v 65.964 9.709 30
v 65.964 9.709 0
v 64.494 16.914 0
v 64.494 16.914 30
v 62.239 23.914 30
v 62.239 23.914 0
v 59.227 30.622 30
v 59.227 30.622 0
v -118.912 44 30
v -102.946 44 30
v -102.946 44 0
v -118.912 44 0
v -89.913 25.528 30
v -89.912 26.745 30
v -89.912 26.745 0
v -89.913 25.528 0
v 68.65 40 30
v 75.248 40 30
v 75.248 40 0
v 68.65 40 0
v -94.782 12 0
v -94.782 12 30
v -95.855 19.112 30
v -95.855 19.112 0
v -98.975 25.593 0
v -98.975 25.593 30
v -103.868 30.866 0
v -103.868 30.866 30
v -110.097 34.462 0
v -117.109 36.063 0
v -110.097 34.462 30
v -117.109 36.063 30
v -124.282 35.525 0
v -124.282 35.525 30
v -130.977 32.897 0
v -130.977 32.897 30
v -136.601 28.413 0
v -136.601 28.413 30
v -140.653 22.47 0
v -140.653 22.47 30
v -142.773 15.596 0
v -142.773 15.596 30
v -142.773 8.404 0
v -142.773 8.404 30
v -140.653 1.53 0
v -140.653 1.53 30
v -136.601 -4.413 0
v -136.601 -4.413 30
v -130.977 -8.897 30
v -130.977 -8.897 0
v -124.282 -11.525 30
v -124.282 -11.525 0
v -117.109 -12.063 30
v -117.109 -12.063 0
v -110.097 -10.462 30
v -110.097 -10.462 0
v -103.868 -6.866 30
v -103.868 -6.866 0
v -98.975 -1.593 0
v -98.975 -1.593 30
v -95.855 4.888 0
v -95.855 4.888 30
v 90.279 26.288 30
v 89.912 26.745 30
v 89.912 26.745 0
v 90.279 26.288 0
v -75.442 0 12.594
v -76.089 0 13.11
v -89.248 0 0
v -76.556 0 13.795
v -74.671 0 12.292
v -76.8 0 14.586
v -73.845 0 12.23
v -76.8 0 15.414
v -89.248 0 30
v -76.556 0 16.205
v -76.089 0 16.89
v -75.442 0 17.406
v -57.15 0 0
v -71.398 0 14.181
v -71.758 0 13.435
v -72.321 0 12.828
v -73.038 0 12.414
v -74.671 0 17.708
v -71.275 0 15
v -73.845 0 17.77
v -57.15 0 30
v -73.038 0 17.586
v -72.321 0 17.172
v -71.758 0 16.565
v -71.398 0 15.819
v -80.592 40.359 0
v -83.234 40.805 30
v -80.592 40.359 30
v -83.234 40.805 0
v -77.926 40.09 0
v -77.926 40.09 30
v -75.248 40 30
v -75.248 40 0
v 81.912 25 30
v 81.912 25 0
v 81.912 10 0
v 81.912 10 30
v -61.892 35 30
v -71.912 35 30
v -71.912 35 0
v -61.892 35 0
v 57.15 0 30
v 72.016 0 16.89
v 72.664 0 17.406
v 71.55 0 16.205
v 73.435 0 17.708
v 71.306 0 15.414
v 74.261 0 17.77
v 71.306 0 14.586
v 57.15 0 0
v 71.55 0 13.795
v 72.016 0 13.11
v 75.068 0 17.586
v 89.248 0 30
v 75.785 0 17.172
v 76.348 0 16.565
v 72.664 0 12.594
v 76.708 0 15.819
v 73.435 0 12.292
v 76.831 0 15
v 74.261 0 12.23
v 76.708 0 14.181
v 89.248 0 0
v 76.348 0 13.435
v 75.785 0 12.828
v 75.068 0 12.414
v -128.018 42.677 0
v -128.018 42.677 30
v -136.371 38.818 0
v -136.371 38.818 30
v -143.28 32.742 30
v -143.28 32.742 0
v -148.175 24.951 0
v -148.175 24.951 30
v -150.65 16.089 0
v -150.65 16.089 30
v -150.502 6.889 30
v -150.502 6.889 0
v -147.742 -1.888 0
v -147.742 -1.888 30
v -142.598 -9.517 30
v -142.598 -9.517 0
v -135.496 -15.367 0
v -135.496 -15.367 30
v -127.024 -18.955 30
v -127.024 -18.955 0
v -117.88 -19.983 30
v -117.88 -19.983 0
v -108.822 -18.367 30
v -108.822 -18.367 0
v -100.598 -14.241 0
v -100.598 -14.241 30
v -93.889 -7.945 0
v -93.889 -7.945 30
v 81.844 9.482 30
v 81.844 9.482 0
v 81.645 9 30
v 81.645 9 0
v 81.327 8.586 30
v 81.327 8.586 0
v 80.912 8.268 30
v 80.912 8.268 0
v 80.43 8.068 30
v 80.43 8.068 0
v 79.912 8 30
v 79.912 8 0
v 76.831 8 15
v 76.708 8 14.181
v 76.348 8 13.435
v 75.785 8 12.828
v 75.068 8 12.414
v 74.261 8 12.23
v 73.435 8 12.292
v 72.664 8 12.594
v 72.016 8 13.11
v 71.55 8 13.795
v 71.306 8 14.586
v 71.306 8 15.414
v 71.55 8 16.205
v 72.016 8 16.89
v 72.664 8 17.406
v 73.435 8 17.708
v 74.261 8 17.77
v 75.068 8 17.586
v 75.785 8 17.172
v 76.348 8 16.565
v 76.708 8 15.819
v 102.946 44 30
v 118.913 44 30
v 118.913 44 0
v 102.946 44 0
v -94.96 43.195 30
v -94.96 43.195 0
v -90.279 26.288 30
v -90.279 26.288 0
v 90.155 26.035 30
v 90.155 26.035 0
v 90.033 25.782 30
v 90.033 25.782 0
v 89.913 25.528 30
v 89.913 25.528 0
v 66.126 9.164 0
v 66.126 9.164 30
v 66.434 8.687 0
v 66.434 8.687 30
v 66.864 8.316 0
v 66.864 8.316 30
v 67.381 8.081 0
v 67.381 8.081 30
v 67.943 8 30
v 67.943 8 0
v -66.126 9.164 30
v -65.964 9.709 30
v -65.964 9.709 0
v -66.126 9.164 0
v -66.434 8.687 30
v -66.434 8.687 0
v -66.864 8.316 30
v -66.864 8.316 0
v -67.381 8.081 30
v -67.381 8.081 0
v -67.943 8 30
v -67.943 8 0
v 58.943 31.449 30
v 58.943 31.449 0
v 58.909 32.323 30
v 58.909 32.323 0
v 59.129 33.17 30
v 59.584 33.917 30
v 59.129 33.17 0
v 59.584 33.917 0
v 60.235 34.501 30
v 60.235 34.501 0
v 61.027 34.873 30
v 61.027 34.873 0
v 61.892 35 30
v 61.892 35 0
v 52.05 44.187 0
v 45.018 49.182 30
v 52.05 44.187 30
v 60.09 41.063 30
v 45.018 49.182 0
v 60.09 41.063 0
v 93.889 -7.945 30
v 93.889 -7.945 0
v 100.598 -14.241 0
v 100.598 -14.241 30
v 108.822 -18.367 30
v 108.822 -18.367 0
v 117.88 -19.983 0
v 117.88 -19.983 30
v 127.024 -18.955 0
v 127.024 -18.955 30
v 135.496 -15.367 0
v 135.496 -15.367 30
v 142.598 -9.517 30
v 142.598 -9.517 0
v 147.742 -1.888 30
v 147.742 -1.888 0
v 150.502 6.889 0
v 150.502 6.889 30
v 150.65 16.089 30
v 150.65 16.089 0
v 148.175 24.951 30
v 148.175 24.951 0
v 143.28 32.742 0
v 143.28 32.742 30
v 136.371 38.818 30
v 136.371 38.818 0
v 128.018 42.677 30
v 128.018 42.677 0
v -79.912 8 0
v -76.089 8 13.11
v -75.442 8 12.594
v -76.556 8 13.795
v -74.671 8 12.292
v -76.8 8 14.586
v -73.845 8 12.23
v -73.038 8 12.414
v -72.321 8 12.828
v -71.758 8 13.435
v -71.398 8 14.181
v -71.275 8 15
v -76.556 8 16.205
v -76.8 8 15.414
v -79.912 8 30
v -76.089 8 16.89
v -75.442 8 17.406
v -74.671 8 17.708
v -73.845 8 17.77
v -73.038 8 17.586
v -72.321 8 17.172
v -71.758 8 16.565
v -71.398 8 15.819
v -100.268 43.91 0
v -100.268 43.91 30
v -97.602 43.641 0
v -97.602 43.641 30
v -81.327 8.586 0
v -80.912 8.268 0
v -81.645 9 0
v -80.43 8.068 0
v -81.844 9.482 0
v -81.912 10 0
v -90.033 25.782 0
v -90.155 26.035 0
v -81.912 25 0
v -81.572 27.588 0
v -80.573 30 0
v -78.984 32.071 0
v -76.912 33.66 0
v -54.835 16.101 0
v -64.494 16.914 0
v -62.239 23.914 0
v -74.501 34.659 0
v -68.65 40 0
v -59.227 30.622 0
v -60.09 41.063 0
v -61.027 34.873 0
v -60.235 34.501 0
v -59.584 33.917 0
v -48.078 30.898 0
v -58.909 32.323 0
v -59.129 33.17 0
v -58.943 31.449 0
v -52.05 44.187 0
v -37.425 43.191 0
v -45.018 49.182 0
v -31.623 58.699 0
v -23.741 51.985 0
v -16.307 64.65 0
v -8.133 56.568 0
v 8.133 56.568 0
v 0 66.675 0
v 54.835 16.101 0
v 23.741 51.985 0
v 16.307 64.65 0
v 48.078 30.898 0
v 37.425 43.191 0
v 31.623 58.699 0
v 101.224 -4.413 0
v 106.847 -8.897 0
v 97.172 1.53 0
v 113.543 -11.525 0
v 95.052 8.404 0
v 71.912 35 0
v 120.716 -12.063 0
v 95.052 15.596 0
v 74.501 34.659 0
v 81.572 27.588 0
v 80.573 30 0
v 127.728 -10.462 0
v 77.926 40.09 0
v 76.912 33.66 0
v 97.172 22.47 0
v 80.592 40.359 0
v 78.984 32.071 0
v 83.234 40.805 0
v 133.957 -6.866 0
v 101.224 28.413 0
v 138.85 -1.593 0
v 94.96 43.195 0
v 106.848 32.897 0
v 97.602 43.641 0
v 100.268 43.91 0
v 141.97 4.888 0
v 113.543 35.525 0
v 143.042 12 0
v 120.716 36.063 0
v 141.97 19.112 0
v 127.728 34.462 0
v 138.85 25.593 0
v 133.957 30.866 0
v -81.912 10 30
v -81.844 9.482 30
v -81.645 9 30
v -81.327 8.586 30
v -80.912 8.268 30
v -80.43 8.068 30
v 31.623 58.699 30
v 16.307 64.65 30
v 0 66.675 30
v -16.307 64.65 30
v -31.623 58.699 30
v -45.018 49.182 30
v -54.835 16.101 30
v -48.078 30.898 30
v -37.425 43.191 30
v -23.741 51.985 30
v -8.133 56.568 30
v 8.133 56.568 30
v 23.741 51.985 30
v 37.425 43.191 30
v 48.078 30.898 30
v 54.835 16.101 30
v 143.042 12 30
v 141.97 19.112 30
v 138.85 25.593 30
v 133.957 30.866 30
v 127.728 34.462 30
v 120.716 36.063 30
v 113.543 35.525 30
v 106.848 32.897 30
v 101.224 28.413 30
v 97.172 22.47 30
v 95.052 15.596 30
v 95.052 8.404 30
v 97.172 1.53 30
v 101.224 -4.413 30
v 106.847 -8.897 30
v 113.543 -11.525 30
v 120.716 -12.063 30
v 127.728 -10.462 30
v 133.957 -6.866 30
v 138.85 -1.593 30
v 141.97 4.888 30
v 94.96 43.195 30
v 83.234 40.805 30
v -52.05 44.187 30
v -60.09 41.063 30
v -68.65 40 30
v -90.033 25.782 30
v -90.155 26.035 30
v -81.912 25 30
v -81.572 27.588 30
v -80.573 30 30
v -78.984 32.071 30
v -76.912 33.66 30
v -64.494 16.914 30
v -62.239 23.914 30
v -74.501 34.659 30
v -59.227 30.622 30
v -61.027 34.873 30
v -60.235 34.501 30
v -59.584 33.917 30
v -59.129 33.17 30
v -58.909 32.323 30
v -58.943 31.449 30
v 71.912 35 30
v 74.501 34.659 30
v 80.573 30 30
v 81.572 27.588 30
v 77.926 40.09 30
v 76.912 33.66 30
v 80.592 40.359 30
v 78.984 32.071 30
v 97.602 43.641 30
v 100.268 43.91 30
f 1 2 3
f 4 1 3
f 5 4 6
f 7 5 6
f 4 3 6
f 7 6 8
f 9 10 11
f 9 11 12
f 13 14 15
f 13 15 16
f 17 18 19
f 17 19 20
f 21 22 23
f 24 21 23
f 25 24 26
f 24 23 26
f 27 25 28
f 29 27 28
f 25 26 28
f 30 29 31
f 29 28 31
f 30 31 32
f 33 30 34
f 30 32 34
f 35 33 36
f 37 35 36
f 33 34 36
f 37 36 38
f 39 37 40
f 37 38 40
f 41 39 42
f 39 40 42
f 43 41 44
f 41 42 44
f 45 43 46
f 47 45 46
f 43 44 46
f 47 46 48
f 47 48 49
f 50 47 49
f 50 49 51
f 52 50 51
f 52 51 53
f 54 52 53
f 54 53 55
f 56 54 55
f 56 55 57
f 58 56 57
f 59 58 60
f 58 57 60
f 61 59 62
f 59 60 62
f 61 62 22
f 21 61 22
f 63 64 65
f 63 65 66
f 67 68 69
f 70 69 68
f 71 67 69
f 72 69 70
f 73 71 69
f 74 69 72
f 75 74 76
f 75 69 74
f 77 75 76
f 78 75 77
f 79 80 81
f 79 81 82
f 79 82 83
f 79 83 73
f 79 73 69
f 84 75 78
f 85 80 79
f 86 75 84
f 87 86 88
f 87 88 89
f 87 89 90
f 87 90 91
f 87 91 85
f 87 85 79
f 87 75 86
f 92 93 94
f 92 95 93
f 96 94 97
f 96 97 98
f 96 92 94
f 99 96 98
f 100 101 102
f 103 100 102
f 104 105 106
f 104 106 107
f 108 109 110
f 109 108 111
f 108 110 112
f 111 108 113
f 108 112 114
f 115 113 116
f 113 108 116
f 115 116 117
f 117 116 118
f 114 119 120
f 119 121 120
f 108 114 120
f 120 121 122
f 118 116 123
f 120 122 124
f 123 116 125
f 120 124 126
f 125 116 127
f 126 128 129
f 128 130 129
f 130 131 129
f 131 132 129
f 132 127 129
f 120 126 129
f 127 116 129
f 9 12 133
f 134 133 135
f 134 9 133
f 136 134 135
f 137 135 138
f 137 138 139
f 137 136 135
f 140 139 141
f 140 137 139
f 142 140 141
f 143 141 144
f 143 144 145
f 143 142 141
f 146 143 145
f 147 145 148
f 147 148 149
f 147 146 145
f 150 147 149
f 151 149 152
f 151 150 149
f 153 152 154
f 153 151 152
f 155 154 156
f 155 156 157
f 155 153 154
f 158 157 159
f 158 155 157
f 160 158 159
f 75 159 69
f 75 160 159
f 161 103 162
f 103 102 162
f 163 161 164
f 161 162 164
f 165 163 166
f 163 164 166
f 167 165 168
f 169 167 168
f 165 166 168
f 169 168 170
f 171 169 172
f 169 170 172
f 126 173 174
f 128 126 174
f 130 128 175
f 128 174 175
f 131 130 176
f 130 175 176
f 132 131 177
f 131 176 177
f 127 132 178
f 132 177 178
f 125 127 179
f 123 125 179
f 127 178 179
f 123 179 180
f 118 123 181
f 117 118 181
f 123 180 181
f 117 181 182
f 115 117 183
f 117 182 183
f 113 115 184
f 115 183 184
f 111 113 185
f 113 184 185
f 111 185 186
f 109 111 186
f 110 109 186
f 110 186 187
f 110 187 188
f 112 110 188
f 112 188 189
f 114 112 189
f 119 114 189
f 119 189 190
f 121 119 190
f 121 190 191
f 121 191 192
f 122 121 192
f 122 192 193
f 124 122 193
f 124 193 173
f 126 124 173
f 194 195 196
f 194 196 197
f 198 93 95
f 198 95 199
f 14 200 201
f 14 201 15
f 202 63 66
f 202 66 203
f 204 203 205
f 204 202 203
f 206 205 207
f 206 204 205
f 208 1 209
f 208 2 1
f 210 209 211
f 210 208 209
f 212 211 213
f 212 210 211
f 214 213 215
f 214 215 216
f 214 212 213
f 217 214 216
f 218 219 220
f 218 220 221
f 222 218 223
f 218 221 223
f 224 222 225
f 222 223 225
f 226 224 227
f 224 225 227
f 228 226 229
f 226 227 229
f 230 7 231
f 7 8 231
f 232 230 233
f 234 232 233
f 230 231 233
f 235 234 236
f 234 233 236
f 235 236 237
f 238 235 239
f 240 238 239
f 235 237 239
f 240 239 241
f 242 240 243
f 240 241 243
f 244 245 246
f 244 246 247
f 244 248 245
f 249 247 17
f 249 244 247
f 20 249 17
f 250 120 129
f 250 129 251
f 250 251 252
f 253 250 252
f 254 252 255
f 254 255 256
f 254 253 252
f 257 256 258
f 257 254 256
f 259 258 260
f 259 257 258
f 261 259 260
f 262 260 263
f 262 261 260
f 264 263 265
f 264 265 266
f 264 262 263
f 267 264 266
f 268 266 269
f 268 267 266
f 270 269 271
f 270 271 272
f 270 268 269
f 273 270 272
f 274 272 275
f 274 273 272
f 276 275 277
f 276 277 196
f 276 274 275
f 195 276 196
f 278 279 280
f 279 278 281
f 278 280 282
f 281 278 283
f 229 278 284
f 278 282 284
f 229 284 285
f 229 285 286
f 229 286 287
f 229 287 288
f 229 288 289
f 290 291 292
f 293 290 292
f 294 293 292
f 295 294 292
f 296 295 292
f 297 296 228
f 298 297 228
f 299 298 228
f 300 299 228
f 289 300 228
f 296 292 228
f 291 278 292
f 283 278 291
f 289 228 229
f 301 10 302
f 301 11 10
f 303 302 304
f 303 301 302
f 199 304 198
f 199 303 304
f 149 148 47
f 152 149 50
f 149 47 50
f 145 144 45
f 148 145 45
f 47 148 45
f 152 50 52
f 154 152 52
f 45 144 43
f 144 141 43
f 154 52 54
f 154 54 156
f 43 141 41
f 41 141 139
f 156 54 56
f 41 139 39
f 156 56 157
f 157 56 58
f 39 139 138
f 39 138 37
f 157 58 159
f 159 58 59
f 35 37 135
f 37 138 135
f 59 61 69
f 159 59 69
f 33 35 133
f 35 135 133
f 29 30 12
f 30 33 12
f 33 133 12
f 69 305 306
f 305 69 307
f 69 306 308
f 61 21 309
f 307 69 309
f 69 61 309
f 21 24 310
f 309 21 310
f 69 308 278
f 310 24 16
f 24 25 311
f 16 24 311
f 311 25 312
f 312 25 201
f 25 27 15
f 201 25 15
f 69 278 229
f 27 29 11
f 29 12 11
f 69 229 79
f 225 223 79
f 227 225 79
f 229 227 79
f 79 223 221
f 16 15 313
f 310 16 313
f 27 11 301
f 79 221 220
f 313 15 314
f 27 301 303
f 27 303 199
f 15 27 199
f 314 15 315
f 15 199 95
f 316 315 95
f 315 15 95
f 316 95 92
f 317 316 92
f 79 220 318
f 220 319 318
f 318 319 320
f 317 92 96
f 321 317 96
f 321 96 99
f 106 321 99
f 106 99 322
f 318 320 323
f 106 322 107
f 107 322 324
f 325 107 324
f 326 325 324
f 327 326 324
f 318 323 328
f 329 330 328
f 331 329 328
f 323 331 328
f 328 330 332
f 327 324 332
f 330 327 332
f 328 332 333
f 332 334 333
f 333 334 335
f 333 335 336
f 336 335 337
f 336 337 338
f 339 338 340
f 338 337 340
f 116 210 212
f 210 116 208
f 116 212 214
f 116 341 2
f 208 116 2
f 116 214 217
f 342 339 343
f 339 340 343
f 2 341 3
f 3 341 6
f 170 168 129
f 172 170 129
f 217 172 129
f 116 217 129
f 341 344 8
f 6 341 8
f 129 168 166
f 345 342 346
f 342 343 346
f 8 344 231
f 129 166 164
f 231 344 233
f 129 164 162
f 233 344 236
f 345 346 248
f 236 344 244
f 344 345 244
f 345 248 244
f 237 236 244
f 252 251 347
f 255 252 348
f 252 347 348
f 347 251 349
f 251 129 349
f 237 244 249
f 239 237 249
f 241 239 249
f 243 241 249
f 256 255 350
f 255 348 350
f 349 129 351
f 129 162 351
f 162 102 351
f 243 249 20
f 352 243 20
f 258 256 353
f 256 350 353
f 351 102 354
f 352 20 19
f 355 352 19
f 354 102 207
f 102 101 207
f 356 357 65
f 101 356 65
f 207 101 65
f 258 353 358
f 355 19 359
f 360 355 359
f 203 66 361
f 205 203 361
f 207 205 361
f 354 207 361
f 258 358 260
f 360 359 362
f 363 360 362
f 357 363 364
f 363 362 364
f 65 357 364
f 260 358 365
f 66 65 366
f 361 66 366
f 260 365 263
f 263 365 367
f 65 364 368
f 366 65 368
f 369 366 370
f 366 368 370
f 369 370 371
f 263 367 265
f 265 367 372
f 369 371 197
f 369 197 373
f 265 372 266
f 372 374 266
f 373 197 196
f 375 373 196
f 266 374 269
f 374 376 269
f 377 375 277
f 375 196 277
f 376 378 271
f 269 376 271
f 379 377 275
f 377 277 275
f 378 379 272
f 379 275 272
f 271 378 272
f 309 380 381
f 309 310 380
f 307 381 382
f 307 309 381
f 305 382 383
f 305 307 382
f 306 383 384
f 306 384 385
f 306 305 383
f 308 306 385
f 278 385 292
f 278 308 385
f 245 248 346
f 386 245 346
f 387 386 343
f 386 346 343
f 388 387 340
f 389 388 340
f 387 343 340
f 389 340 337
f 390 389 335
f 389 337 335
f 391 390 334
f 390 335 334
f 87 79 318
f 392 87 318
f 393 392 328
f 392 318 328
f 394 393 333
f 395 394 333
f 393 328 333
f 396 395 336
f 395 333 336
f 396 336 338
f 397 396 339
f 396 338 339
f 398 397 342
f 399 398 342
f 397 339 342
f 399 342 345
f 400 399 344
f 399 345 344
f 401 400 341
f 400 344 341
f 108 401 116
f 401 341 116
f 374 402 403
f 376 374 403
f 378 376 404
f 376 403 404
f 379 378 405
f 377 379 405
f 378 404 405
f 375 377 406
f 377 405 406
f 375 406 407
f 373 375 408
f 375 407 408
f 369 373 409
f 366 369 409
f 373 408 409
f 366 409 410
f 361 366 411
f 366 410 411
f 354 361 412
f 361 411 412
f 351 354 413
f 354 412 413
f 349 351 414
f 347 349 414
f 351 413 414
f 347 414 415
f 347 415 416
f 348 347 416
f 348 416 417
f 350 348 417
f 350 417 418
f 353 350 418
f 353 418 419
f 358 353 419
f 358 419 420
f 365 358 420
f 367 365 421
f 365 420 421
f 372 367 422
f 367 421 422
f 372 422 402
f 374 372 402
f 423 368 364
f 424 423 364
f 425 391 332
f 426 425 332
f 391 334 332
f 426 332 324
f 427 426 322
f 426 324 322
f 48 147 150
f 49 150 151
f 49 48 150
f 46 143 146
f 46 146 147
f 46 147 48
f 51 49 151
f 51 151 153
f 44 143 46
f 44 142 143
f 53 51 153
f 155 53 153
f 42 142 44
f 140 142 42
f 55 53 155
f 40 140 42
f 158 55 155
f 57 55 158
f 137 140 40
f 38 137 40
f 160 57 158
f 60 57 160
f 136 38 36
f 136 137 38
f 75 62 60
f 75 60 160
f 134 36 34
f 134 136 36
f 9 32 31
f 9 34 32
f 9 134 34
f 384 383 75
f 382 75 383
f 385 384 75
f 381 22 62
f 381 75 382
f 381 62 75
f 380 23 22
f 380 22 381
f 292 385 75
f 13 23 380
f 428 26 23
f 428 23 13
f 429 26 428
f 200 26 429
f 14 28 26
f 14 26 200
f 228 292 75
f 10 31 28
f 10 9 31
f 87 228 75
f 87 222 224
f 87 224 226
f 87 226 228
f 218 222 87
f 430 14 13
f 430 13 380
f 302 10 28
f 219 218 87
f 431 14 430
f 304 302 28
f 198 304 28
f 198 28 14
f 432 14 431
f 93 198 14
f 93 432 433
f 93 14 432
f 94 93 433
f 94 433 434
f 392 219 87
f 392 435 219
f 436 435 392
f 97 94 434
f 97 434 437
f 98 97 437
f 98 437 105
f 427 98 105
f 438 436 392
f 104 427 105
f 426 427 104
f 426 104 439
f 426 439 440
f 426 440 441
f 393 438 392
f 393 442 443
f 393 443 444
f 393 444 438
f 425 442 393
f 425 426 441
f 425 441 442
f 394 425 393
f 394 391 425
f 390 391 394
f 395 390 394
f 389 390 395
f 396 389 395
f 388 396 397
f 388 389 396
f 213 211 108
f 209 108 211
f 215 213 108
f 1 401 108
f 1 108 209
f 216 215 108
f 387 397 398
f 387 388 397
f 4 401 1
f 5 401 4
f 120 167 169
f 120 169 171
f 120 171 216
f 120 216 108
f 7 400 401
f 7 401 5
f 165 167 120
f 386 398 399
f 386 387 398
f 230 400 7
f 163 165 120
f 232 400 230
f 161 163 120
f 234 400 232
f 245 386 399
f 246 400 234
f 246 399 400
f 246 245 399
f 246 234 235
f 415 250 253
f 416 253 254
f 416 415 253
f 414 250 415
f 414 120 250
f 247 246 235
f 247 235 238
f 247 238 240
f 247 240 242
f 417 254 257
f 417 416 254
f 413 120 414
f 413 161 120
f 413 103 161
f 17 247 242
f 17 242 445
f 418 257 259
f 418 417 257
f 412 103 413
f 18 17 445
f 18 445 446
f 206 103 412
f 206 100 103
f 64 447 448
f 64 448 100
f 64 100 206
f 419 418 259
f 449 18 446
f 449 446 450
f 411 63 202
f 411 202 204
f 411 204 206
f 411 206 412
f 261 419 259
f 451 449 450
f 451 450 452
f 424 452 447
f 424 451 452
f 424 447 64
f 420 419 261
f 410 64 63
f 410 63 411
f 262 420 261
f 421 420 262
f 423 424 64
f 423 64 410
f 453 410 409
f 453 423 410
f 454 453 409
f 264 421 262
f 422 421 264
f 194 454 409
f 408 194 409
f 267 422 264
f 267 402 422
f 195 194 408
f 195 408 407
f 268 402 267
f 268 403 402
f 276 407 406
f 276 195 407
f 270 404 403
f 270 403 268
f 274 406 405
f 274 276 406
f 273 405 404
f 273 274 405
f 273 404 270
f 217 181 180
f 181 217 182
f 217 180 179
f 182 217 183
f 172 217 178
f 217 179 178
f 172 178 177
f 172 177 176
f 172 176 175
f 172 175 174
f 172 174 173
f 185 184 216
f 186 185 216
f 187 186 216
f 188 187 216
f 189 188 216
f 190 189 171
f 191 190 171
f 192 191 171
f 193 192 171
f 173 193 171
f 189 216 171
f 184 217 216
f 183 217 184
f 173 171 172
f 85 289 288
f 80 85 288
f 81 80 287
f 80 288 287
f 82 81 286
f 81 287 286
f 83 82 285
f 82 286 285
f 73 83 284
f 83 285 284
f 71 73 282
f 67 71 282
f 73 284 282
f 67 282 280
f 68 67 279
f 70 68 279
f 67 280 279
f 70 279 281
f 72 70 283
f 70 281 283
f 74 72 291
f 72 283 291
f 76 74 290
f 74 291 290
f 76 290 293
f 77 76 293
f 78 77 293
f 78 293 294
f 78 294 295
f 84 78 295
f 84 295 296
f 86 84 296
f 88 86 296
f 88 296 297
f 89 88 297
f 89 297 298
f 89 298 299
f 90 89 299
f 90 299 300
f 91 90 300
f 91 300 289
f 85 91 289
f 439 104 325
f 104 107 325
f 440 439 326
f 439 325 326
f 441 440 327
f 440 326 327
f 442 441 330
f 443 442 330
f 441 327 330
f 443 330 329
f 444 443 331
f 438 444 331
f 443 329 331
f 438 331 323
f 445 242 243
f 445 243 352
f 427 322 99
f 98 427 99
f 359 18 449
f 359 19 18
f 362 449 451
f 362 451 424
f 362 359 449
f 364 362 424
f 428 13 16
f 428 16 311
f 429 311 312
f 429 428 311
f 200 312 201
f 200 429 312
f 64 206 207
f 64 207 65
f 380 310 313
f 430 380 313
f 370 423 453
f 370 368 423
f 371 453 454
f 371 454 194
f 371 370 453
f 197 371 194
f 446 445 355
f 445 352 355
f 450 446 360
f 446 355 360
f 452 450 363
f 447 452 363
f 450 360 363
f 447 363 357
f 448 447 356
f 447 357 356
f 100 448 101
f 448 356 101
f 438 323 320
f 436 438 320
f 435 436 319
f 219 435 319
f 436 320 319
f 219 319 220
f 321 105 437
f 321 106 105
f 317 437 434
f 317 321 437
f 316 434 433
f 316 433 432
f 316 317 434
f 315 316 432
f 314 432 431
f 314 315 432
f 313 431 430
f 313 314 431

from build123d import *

# Parameters (mm, degrees)
BOSS_EXTRUDE1_DEPTH = 30
SKETCH2_W           = 20
SKETCH2_H           = 8
BOSS_EXTRUDE2_DEPTH = 30
BOSS_EXTRUDE3_DEPTH = 30
FILLET2_R           = 35
FILLET3_R           = 3
SKETCH5_R           = 2.778125
CUT_EXTRUDE2_DEPTH  = 9
SKETCH6_R           = 24.13
BOSS_EXTRUDE4_DEPTH = 30
FILLET4_R           = 40
FILLET5_R           = 10
FILLET6_R           = 2


with BuildPart() as part:
    # Sketch1 → Boss-Extrude1 (new body)
    with BuildSketch(Plane.XY):
        with BuildLine():
            ThreePointArc((66.675, 0), (0, 66.675), (-66.675, 0))
            Line((-66.675, 0), (-57.15, 0))
            ThreePointArc((-57.15, 0), (0, 57.15), (57.15, 0))
            Line((57.15, 0), (66.675, 0))
        make_face()
    extrude(amount=BOSS_EXTRUDE1_DEPTH)

    # Sketch2 → Boss-Extrude2 (add)
    with BuildSketch(Plane.XY.offset(30)):
        with Locations((-71.9125, 4)):
            Rectangle(SKETCH2_W, SKETCH2_H)
        with Locations((71.9125, 4)):
            Rectangle(SKETCH2_W, SKETCH2_H)
    extrude(amount=-BOSS_EXTRUDE2_DEPTH)

    # Sketch4 → Boss-Extrude3 (add)
    with BuildSketch(Plane.XY.offset(30)):
        with BuildLine():
            Line((-89.9125, 40), (-89.9125, 35))
            Line((-89.9125, 35), (-81.9125, 35))
            Line((-81.9125, 35), (-56.749939427, 35))
            ThreePointArc((-56.749939427, 35), (-55.103585117, 37.538653841), (-53.343749634, 40))
            Line((-53.343749634, 40), (-89.9125, 40))
        make_face()
        Polygon((-89.9125, 0), (-81.9125, 0), (-81.9125, 8), (-81.9125, 35), (-89.9125, 35), align=None)
        with BuildLine():
            Line((89.9125, 40), (53.343749634, 40))
            ThreePointArc((53.343749634, 40), (55.103585117, 37.538653841), (56.749939427, 35))
            Line((56.749939427, 35), (81.9125, 35))
            Line((81.9125, 35), (89.9125, 35))
            Line((89.9125, 35), (89.9125, 40))
        make_face()
        Polygon((89.9125, 0), (89.9125, 35), (81.9125, 35), (81.9125, 8), (81.9125, 0), align=None)
    extrude(amount=-BOSS_EXTRUDE3_DEPTH)

    # Fillet2
    fillet2_edges = [part.edges().sort_by_distance(p)[0] for p in [
        (-53.343749634, 40, 15),
        (53.343749634, 40, 15),
    ]]
    fillet(fillet2_edges, radius=FILLET2_R)

    # Fillet3
    fillet3_edges = [part.edges().sort_by_distance(p)[0] for p in [
        (-56.749939427, 35, 15),
        (56.749939427, 35, 15),
    ]]
    fillet(fillet3_edges, radius=FILLET3_R)

    # Sketch5 → Cut-Extrude2 (cut, through all)
    with BuildSketch(Plane(origin=(0, 8, 0), x_dir=(1, 0, 0), z_dir=(0, 1, 0))):
        with Locations((-74.052910047, -15)):
            Circle(SKETCH5_R)
        with Locations((74.052910047, -15)):
            Circle(SKETCH5_R)
    extrude(amount=-CUT_EXTRUDE2_DEPTH, mode=Mode.SUBTRACT)

    # Sketch6 → Boss-Extrude4 (add)
    with BuildSketch(Plane.XY.offset(30)):
        with BuildLine():
            Line((-98.9125, 44), (-118.9125, 44))
            ThreePointArc((-118.9125, 44), (-135.746949407, -15.213991129), (-90.279215199, 26.287582073))
            Line((-90.279215199, 26.287582073), (-79.281188547, 40))
            Line((-79.281188547, 40), (-98.9125, 44))
        make_face()
        with Locations((-118.9125, 12)):
            Circle(SKETCH6_R, mode=Mode.SUBTRACT)
        with BuildLine():
            Line((98.9125, 44), (79.281188547, 40))
            Line((79.281188547, 40), (90.279215199, 26.287582073))
            ThreePointArc((90.279215199, 26.287582073), (135.746949407, -15.213991129), (118.9125, 44))
            Line((118.9125, 44), (98.9125, 44))
        make_face()
        with Locations((118.9125, 12)):
            Circle(SKETCH6_R, mode=Mode.SUBTRACT)
    extrude(amount=-BOSS_EXTRUDE4_DEPTH)

    # Fillet4
    fillet4_edges = [part.edges().sort_by_distance(p)[0] for p in [
        (-98.9125, 44, 15),
        (-79.281188547, 40, 15),
        (79.281188547, 40, 15),
        (98.9125, 44, 15),
    ]]
    fillet(fillet4_edges, radius=FILLET4_R)

    # Fillet5
    fillet5_edges = [part.edges().sort_by_distance(p)[0] for p in [
        (-81.9125, 35, 15),
        (81.9125, 35, 15),
    ]]
    fillet(fillet5_edges, radius=FILLET5_R)

    # Fillet6
    fillet6_edges = [part.edges().sort_by_distance(p)[0] for p in [
        (-81.9125, 8, 15),
        (-66.193320093, 8, 15),
        (66.193320093, 8, 15),
        (81.9125, 8, 15),
    ]]
    fillet(fillet6_edges, radius=FILLET6_R)


solid = part.part
